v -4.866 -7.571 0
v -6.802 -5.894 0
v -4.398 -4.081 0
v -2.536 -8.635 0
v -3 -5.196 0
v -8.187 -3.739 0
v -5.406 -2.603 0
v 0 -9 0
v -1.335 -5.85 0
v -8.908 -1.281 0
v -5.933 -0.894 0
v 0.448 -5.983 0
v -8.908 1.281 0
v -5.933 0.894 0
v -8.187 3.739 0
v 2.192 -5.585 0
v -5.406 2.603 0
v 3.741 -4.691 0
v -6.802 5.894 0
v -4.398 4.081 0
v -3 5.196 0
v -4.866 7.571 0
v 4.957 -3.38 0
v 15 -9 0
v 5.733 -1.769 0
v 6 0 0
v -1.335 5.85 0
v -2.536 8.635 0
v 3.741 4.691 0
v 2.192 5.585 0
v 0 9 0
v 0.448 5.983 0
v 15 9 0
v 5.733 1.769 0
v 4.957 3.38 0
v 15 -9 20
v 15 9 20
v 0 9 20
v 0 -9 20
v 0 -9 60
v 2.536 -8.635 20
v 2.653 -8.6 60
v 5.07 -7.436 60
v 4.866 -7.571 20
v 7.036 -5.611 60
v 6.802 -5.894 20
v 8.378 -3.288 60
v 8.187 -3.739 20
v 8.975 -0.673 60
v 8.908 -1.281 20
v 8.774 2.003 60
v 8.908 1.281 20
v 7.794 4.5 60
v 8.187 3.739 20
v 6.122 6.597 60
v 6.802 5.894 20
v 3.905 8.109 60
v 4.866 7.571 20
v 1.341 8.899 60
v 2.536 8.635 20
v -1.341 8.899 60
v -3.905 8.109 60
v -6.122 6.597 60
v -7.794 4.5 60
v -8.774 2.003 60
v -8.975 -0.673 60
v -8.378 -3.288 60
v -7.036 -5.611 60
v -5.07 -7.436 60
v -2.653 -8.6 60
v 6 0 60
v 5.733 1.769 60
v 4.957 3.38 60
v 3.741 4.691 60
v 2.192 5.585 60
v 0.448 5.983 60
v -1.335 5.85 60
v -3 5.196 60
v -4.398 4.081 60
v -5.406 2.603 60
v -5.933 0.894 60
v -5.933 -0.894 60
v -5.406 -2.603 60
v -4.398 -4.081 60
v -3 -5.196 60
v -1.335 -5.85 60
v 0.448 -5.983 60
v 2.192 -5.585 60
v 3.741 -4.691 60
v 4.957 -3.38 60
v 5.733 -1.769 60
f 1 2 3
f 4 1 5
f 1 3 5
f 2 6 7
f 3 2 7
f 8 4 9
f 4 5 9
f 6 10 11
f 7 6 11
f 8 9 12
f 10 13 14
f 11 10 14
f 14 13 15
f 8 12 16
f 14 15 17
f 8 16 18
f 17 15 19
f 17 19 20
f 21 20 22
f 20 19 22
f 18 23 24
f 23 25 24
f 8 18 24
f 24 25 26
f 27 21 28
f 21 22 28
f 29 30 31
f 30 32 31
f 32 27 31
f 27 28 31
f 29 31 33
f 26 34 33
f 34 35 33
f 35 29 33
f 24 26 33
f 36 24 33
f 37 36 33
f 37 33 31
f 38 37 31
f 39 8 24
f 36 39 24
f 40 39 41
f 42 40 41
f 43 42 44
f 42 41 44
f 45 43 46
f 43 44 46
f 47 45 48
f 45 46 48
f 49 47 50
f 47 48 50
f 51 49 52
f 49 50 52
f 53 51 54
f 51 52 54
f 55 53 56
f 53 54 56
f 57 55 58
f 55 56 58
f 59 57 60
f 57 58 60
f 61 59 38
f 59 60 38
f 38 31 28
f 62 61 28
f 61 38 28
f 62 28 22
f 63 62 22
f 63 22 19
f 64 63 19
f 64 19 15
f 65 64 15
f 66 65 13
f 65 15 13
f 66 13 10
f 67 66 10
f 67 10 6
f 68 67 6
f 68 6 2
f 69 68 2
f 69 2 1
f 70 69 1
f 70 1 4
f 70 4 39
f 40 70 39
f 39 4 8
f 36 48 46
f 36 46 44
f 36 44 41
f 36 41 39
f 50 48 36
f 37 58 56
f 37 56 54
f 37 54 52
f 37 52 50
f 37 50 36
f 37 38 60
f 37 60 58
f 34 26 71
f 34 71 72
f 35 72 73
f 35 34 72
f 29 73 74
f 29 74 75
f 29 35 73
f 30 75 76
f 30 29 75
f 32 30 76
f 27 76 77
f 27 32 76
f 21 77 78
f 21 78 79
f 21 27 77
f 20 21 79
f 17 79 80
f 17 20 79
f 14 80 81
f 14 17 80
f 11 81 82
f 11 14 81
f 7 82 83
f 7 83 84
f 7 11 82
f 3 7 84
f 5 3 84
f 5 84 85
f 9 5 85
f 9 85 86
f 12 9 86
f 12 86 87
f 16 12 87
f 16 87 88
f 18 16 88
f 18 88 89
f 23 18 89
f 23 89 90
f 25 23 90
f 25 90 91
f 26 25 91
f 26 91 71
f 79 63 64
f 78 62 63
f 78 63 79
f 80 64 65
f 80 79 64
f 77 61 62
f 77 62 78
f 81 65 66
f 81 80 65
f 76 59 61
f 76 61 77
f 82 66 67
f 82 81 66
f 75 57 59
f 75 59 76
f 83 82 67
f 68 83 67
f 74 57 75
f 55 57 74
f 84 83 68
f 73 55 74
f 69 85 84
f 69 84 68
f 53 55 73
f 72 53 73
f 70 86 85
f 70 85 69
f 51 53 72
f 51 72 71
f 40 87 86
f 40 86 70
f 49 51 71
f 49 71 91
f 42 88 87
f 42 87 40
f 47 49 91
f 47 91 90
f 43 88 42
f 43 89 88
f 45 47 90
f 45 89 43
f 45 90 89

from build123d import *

# Parameters (mm, degrees)
ESQUISSE1_R        = 6
BOSS_EXTRU_1_DEPTH = 20
ESQUISSE1_3_R      = 6
BOSS_EXTRU_2_DEPTH = 60


with BuildPart() as part:
    # Esquisse1 → Boss.-Extru.1 (new body)
    with BuildSketch(Plane.XY):
        with BuildLine():
            Line((15, 9), (0, 9))
            ThreePointArc((0, 9), (-9, 0), (0, -9))
            Line((0, -9), (15, -9))
            Line((15, -9), (15, 9))
        make_face()
        Circle(ESQUISSE1_R, mode=Mode.SUBTRACT)
    extrude(amount=BOSS_EXTRU_1_DEPTH)

    # Esquisse1<3> → Boss.-Extru.2 (add)
    with BuildSketch(Plane.XY):
        with BuildLine():
            ThreePointArc((9, 0), (6.363961031, 6.363961031), (0, 9))
            ThreePointArc((0, 9), (-9, 0), (0, -9))
            ThreePointArc((0, -9), (6.363961031, -6.363961031), (9, 0))
        make_face()
        Circle(ESQUISSE1_3_R, mode=Mode.SUBTRACT)
    extrude(amount=BOSS_EXTRU_2_DEPTH)


solid = part.part
